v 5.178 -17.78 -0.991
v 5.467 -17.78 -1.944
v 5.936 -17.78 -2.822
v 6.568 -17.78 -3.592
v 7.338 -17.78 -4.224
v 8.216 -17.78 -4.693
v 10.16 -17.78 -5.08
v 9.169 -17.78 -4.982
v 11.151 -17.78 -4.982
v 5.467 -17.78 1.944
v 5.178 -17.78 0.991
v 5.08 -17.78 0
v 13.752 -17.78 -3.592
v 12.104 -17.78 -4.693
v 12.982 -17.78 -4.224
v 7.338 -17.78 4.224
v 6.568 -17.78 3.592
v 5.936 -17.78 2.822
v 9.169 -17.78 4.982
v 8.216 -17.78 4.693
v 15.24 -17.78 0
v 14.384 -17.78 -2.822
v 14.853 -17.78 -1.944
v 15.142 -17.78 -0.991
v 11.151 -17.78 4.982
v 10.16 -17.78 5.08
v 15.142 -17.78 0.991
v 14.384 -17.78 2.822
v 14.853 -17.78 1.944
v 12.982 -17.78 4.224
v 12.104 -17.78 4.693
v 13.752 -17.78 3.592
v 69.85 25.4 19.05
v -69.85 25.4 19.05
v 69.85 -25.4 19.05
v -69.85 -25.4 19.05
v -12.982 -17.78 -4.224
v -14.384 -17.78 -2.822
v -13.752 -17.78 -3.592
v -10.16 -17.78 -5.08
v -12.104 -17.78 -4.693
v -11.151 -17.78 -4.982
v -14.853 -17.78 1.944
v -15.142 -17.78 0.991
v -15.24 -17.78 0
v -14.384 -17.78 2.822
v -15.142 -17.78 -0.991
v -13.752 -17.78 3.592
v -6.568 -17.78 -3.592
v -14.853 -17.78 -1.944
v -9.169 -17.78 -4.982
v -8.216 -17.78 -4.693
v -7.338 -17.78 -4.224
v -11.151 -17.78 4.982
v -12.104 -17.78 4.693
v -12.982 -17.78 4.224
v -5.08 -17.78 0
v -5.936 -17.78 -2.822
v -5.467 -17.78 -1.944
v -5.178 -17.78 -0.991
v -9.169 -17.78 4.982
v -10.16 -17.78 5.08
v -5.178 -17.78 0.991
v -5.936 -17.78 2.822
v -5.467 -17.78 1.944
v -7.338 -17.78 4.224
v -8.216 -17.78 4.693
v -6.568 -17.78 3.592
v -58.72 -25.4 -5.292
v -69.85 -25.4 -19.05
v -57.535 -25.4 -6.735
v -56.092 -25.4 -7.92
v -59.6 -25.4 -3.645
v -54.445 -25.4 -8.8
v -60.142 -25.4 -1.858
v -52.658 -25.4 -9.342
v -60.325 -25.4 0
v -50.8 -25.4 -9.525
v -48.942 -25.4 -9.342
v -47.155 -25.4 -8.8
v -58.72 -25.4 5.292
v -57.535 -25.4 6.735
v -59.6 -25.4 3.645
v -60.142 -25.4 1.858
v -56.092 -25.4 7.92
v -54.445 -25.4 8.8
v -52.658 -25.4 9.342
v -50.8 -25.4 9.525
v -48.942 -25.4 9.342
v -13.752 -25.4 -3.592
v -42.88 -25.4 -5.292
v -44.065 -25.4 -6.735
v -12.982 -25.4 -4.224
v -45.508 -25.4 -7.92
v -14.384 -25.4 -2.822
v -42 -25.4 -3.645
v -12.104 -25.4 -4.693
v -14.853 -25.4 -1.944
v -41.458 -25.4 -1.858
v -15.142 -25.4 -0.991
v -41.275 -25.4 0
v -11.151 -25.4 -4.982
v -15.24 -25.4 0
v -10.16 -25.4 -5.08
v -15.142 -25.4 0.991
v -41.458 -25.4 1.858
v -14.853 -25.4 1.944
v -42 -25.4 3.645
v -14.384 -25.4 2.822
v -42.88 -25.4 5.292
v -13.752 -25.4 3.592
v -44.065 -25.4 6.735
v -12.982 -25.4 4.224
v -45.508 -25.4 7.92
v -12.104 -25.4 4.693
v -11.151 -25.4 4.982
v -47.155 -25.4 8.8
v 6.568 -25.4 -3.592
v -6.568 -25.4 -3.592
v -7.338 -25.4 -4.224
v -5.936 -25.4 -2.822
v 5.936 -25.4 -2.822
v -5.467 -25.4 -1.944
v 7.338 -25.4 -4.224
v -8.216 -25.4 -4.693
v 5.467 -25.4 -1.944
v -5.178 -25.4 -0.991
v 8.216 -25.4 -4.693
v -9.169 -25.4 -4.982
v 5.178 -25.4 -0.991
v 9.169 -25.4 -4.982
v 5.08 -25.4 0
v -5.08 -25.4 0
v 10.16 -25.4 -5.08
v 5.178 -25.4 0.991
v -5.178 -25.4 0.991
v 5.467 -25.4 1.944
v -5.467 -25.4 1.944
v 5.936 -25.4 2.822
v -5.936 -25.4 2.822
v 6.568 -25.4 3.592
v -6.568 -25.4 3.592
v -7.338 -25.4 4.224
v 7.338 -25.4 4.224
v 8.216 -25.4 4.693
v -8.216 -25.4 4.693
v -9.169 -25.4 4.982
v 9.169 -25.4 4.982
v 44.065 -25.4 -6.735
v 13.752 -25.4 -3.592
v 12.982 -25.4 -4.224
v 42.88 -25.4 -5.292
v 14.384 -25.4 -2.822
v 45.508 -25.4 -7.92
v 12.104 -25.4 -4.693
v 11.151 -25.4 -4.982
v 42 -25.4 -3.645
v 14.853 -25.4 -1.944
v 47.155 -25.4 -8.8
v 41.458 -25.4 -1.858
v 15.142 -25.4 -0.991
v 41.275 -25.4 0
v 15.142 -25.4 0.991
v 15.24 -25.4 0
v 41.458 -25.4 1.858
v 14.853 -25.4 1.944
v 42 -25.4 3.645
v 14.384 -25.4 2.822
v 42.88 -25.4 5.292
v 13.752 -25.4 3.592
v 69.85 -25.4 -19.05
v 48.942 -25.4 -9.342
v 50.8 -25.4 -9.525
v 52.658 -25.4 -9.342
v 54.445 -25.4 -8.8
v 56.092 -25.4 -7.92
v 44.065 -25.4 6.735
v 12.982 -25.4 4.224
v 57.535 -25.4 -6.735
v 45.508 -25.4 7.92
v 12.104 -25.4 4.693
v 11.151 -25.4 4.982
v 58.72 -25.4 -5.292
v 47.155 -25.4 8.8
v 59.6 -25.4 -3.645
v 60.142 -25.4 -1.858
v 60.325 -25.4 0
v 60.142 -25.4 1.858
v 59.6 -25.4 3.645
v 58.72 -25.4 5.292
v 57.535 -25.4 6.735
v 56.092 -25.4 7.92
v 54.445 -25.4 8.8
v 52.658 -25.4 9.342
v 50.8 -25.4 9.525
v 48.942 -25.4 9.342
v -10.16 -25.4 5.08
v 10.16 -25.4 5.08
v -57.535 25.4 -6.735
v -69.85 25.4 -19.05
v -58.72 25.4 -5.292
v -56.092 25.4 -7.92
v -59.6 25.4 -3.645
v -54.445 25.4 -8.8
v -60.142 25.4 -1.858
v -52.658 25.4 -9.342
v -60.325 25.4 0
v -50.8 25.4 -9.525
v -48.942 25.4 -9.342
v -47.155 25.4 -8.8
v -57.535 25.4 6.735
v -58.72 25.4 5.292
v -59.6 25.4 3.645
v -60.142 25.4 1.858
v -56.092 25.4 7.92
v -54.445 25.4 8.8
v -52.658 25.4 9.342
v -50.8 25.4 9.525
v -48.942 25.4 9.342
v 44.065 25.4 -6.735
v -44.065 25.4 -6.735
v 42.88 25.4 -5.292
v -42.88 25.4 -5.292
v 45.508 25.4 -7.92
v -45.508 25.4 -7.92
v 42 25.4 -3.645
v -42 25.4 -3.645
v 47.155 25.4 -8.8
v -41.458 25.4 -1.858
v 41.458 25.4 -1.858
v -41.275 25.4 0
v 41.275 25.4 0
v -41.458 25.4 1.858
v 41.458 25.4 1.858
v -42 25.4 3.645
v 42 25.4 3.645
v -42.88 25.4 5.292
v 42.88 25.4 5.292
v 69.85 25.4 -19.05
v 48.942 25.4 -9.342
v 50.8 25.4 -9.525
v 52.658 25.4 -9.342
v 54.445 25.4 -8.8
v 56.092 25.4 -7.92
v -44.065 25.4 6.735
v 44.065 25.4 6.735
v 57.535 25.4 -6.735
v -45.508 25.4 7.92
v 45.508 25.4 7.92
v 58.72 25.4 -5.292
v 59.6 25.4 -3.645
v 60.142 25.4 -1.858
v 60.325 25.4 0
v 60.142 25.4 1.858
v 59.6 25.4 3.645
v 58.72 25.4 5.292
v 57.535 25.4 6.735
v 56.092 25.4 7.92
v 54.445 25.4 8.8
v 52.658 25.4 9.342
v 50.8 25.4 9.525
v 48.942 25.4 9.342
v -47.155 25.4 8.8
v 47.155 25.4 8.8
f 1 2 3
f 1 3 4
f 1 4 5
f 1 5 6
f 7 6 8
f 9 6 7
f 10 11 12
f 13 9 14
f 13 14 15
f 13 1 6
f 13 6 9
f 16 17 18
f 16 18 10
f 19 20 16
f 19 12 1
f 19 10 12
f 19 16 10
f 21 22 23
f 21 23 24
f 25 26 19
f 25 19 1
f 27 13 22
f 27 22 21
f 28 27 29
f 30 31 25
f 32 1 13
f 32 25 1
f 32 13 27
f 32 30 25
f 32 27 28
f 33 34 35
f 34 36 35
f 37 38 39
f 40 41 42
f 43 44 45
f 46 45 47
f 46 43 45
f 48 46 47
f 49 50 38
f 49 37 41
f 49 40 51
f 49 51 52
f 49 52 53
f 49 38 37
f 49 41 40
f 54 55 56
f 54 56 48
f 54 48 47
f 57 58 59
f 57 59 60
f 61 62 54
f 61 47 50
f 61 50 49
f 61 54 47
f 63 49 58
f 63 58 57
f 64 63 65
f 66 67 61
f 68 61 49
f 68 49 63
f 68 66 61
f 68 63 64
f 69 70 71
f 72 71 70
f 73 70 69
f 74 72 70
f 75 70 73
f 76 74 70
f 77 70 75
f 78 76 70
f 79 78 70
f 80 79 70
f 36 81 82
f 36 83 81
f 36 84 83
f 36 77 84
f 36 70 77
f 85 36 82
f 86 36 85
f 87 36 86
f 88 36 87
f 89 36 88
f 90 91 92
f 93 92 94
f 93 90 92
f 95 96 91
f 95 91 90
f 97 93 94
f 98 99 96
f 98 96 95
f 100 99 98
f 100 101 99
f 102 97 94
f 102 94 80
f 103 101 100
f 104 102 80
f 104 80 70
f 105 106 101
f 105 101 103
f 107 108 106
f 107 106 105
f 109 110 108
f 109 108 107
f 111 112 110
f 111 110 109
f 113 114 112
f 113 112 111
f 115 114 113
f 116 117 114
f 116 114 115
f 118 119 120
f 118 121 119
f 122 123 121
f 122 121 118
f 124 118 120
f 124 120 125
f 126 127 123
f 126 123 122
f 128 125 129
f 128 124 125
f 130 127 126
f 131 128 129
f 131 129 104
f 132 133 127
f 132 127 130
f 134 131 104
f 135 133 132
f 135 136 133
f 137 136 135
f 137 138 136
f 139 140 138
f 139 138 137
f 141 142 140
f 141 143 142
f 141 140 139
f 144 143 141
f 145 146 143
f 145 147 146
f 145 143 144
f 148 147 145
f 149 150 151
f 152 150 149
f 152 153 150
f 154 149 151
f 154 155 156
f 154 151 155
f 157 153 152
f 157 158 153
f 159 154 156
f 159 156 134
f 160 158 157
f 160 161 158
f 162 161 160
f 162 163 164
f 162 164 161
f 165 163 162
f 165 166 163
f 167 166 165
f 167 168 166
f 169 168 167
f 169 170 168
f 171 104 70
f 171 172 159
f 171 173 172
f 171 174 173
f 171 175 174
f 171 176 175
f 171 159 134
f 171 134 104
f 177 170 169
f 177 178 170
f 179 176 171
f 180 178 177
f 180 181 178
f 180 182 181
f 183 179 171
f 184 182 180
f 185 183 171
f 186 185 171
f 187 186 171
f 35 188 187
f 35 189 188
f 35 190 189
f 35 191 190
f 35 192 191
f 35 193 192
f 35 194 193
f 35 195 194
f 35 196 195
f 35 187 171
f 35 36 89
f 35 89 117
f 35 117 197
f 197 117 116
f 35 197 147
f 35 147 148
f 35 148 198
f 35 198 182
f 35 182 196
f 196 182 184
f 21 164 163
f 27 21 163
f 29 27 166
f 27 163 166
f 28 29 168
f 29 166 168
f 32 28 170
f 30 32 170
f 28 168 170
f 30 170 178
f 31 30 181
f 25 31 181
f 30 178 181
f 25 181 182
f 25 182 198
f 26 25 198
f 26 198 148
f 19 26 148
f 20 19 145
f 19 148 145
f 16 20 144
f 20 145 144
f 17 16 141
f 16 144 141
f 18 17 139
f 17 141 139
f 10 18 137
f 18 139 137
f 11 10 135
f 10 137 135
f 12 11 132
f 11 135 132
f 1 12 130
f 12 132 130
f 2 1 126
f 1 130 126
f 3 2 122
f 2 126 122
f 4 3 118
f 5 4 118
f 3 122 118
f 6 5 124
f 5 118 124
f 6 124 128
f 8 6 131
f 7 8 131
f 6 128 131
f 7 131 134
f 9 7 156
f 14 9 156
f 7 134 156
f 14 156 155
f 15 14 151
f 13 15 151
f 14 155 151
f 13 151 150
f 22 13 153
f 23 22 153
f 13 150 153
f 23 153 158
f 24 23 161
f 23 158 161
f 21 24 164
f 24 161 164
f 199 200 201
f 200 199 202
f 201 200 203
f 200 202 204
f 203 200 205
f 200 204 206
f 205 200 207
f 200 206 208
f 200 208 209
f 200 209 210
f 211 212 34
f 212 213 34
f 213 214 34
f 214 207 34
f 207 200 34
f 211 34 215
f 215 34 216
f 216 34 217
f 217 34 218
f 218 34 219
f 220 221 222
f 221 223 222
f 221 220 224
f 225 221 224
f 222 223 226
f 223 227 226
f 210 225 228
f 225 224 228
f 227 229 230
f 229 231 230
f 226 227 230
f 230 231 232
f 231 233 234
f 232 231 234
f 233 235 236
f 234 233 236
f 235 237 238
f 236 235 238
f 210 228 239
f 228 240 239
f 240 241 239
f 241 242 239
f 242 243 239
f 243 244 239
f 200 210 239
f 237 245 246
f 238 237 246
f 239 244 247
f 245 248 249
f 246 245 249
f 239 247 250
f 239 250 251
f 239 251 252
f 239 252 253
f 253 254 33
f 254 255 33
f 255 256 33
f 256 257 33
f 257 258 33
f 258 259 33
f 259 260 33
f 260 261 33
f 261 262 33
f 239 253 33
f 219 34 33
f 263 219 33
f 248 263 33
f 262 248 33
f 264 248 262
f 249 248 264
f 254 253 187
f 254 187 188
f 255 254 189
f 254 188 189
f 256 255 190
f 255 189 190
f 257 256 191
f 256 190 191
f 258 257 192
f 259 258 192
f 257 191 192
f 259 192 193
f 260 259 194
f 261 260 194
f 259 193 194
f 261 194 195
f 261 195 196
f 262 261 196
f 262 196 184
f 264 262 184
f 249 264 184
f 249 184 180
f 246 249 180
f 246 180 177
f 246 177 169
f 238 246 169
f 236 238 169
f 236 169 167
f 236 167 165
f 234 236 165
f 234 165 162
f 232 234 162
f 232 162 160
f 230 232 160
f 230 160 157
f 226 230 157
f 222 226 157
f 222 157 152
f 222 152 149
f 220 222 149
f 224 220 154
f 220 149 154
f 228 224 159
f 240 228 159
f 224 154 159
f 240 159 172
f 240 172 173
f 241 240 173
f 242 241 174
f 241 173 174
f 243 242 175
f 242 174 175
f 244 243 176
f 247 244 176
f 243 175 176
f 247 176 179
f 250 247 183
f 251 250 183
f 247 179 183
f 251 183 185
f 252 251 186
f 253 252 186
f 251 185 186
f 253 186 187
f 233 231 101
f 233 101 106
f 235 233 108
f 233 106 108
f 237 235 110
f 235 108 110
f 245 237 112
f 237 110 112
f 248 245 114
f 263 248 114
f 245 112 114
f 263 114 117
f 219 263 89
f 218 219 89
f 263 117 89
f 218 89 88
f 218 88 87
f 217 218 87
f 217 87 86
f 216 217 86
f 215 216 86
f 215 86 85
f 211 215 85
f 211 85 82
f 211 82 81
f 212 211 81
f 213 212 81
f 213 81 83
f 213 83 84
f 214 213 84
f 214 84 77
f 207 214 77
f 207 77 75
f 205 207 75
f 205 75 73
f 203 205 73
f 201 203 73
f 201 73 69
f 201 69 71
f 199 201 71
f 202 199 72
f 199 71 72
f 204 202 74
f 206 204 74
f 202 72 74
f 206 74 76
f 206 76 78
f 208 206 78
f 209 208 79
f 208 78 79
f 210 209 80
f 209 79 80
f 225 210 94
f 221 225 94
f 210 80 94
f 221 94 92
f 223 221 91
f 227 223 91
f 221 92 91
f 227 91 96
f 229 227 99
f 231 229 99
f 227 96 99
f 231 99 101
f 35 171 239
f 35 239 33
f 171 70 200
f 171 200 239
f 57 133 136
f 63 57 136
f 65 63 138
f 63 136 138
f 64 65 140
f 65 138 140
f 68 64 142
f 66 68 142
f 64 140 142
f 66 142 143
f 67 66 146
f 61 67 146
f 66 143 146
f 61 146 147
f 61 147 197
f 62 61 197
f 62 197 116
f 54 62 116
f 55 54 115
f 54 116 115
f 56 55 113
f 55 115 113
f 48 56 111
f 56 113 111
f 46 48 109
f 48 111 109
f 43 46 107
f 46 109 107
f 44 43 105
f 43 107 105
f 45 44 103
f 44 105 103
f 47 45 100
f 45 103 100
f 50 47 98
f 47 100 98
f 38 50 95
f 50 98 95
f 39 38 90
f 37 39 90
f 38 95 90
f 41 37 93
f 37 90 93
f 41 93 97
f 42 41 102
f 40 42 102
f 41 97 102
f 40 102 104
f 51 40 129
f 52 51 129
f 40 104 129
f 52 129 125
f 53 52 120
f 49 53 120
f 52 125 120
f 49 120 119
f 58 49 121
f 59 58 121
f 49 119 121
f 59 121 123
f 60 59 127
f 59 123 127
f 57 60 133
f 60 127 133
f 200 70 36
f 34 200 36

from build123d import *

# Parameters (mm, degrees)
F0_W     = 139.7
F0_H     = 38.1
F1_DEPTH = 25.4
F2_R     = 9.525
F3_DEPTH = 50.801
F4_R     = 5.08
F5_DEPTH = 7.62


with BuildPart() as f1:
    # F0 (on Front) → F1 (new body, symmetric)
    with BuildSketch(Plane.XZ):
        Rectangle(F0_W, F0_H)
    extrude(amount=F1_DEPTH, both=True)

    # F2 (on face) → F3 (cut, through all)
    with BuildSketch(Plane.XZ.offset(25.4)):
        with Locations((-50.8, 0)):
            Circle(F2_R)
        with Locations((50.8, 0)):
            Circle(F2_R)
    extrude(amount=-F3_DEPTH, mode=Mode.SUBTRACT)

    # F4 (on face) → F5 (cut)
    with BuildSketch(Plane.XZ.offset(25.4)):
        with Locations((-10.16, 0)):
            Circle(F4_R)
        with Locations((10.16, 0)):
            Circle(F4_R)
    extrude(amount=-F5_DEPTH, mode=Mode.SUBTRACT)


solid = f1.part
